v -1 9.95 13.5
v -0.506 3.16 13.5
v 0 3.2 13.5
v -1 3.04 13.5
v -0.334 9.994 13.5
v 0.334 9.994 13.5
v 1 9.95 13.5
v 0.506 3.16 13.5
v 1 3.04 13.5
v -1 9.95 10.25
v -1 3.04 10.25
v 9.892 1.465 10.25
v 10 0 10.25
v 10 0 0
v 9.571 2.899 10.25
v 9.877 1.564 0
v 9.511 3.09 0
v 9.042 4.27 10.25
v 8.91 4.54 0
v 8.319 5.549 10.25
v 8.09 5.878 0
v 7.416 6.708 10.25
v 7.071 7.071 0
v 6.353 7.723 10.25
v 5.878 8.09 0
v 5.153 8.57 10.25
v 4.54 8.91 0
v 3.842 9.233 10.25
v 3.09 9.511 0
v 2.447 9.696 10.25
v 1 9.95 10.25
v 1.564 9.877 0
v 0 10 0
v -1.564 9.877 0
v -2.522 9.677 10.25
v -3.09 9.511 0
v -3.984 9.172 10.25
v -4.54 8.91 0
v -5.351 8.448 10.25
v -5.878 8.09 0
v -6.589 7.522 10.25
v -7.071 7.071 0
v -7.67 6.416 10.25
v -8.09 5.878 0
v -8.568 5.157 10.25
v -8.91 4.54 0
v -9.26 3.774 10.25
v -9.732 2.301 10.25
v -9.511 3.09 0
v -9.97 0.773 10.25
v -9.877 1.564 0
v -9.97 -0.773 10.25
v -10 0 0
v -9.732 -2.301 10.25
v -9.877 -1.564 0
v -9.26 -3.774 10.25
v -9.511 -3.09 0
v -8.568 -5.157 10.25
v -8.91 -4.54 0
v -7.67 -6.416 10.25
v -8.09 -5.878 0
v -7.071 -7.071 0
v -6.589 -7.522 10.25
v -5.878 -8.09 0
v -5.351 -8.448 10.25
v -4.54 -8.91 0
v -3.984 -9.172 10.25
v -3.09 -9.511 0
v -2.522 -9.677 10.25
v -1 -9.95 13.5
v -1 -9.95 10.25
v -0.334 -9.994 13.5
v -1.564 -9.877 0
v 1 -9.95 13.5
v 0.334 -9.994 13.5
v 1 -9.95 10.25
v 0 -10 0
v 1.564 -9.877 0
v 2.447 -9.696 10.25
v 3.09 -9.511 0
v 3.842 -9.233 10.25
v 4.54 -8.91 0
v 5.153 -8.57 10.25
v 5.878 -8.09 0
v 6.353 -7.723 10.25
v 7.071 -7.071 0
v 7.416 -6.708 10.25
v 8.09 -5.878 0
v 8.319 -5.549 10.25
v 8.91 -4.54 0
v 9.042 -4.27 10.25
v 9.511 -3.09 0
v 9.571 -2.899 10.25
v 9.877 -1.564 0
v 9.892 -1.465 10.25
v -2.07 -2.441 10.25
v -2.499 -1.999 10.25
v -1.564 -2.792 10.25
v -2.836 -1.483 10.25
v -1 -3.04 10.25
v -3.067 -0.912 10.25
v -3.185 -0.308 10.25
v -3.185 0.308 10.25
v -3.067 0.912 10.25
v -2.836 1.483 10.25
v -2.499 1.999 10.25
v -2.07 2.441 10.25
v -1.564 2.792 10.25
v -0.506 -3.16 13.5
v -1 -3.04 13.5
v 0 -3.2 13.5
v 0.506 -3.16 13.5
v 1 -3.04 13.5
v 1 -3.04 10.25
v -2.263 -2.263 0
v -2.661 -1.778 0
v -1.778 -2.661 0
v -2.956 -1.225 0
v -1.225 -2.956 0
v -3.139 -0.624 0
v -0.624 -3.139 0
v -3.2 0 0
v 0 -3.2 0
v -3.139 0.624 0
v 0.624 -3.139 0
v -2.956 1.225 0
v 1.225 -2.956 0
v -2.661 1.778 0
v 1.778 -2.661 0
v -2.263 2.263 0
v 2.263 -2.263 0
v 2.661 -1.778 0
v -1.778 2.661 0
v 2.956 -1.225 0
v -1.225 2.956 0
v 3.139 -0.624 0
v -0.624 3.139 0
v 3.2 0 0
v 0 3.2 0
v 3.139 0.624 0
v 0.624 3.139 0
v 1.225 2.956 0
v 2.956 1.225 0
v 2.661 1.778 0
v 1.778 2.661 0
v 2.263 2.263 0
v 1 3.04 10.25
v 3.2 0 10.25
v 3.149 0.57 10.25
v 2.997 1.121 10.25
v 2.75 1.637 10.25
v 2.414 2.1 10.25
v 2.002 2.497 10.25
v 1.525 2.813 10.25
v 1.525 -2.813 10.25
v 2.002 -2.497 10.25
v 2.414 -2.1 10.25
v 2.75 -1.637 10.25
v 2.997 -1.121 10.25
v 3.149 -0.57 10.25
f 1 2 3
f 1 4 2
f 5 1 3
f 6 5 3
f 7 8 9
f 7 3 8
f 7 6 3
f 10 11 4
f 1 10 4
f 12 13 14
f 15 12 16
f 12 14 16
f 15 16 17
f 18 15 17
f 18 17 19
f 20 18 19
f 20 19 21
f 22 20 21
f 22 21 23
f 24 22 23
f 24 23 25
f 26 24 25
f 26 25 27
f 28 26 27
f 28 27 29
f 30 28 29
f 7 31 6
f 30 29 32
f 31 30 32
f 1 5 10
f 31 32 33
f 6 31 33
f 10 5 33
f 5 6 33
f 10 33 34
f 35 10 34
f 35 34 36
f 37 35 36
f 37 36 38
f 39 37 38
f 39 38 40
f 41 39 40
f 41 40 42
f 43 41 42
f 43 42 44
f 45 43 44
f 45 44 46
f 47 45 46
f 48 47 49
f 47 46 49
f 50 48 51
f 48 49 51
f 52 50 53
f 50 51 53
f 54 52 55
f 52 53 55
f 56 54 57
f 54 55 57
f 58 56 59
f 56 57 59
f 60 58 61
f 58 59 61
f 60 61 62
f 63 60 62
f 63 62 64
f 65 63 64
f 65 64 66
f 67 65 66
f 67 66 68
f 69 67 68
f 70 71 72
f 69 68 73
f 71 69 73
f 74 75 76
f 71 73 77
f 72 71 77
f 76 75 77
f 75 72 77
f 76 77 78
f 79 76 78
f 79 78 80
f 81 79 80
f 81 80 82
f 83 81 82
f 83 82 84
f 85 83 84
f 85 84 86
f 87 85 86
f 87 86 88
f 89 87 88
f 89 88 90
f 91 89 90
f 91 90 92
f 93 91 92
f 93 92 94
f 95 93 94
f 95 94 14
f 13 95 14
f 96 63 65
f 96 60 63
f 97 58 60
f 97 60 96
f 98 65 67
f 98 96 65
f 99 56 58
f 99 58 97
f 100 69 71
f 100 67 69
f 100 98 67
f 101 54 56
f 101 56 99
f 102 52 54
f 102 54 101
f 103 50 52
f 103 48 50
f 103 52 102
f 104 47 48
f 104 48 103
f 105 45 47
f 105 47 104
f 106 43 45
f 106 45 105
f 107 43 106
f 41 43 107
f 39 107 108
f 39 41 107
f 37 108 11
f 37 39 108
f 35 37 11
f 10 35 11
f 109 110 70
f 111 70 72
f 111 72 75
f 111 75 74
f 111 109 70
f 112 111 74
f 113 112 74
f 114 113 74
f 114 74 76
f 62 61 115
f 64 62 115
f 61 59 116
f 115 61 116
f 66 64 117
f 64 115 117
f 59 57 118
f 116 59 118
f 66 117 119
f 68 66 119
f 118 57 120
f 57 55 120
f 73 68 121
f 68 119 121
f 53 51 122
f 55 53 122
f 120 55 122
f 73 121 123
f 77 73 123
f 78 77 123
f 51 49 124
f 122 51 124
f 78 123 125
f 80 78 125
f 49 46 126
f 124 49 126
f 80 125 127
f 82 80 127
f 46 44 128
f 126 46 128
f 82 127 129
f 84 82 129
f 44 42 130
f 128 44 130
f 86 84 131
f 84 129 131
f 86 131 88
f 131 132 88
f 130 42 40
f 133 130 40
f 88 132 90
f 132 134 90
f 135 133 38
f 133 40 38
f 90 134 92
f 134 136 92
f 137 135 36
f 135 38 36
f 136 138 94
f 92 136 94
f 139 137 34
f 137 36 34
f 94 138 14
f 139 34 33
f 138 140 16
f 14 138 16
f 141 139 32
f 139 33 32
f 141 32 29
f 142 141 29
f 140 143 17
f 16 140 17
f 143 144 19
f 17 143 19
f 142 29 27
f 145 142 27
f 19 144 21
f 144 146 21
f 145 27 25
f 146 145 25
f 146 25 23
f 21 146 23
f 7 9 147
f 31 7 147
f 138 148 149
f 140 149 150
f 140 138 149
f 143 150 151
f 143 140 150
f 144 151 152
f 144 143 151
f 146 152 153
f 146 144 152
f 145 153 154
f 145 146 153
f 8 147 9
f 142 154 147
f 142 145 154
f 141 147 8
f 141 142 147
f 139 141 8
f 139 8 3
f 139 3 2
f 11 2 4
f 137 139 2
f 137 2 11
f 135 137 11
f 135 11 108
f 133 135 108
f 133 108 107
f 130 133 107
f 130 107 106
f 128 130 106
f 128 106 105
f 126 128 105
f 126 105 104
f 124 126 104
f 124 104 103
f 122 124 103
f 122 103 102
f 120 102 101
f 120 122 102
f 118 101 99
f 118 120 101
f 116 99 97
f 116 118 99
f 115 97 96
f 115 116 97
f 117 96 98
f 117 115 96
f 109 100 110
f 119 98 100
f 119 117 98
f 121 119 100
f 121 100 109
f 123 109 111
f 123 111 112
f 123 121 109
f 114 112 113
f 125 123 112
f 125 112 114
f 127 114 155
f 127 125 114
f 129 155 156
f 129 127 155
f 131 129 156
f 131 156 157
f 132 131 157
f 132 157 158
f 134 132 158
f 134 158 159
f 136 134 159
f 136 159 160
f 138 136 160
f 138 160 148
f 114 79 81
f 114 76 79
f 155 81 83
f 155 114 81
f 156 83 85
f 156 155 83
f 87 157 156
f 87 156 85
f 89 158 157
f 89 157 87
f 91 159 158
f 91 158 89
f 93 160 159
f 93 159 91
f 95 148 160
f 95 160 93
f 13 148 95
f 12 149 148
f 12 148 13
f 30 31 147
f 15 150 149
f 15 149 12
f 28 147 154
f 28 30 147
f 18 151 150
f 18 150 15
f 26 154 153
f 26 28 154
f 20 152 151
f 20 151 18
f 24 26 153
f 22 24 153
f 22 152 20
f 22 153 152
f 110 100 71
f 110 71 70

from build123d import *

# Parameters (mm, degrees)
F0_R     = 10
F0_R_2   = 3.2
F2_DEPTH = 13.5
F3_DEPTH = 25
F4_DEPTH = 11.4


with BuildPart() as f2:
    # F0 (on Top) → F2 (new body)
    with BuildSketch(Plane.XY):
        Circle(F0_R)
        Circle(F0_R_2, mode=Mode.SUBTRACT)
    extrude(amount=F2_DEPTH)

    # F1 (on Front) → F3 (cut)
    with BuildSketch(Plane.XZ):
        Polygon((-1, 10.25), (-1, 12.5), (-1, 15.121175), (-10.774387, 15.121175), (-10.774387, 12.5), (-10.774387, 10.25), (-3, 10.25), align=None)
        Polygon((1, 15.121175), (1, 12.5), (1, 10.25), (3, 10.25), (10.738912, 10.25), (10.738912, 12.5), (10.738912, 15.121175), align=None)
    extrude(amount=-F3_DEPTH, mode=Mode.SUBTRACT)

    # F1 (on Front) → F4 (cut)
    with BuildSketch(Plane.XZ):
        Polygon((-1, 10.25), (-1, 12.5), (-1, 15.121175), (-10.774387, 15.121175), (-10.774387, 12.5), (-10.774387, 10.25), (-3, 10.25), align=None)
        Polygon((1, 15.121175), (1, 12.5), (1, 10.25), (3, 10.25), (10.738912, 10.25), (10.738912, 12.5), (10.738912, 15.121175), align=None)
    extrude(amount=F4_DEPTH, mode=Mode.SUBTRACT)


solid = f2.part
